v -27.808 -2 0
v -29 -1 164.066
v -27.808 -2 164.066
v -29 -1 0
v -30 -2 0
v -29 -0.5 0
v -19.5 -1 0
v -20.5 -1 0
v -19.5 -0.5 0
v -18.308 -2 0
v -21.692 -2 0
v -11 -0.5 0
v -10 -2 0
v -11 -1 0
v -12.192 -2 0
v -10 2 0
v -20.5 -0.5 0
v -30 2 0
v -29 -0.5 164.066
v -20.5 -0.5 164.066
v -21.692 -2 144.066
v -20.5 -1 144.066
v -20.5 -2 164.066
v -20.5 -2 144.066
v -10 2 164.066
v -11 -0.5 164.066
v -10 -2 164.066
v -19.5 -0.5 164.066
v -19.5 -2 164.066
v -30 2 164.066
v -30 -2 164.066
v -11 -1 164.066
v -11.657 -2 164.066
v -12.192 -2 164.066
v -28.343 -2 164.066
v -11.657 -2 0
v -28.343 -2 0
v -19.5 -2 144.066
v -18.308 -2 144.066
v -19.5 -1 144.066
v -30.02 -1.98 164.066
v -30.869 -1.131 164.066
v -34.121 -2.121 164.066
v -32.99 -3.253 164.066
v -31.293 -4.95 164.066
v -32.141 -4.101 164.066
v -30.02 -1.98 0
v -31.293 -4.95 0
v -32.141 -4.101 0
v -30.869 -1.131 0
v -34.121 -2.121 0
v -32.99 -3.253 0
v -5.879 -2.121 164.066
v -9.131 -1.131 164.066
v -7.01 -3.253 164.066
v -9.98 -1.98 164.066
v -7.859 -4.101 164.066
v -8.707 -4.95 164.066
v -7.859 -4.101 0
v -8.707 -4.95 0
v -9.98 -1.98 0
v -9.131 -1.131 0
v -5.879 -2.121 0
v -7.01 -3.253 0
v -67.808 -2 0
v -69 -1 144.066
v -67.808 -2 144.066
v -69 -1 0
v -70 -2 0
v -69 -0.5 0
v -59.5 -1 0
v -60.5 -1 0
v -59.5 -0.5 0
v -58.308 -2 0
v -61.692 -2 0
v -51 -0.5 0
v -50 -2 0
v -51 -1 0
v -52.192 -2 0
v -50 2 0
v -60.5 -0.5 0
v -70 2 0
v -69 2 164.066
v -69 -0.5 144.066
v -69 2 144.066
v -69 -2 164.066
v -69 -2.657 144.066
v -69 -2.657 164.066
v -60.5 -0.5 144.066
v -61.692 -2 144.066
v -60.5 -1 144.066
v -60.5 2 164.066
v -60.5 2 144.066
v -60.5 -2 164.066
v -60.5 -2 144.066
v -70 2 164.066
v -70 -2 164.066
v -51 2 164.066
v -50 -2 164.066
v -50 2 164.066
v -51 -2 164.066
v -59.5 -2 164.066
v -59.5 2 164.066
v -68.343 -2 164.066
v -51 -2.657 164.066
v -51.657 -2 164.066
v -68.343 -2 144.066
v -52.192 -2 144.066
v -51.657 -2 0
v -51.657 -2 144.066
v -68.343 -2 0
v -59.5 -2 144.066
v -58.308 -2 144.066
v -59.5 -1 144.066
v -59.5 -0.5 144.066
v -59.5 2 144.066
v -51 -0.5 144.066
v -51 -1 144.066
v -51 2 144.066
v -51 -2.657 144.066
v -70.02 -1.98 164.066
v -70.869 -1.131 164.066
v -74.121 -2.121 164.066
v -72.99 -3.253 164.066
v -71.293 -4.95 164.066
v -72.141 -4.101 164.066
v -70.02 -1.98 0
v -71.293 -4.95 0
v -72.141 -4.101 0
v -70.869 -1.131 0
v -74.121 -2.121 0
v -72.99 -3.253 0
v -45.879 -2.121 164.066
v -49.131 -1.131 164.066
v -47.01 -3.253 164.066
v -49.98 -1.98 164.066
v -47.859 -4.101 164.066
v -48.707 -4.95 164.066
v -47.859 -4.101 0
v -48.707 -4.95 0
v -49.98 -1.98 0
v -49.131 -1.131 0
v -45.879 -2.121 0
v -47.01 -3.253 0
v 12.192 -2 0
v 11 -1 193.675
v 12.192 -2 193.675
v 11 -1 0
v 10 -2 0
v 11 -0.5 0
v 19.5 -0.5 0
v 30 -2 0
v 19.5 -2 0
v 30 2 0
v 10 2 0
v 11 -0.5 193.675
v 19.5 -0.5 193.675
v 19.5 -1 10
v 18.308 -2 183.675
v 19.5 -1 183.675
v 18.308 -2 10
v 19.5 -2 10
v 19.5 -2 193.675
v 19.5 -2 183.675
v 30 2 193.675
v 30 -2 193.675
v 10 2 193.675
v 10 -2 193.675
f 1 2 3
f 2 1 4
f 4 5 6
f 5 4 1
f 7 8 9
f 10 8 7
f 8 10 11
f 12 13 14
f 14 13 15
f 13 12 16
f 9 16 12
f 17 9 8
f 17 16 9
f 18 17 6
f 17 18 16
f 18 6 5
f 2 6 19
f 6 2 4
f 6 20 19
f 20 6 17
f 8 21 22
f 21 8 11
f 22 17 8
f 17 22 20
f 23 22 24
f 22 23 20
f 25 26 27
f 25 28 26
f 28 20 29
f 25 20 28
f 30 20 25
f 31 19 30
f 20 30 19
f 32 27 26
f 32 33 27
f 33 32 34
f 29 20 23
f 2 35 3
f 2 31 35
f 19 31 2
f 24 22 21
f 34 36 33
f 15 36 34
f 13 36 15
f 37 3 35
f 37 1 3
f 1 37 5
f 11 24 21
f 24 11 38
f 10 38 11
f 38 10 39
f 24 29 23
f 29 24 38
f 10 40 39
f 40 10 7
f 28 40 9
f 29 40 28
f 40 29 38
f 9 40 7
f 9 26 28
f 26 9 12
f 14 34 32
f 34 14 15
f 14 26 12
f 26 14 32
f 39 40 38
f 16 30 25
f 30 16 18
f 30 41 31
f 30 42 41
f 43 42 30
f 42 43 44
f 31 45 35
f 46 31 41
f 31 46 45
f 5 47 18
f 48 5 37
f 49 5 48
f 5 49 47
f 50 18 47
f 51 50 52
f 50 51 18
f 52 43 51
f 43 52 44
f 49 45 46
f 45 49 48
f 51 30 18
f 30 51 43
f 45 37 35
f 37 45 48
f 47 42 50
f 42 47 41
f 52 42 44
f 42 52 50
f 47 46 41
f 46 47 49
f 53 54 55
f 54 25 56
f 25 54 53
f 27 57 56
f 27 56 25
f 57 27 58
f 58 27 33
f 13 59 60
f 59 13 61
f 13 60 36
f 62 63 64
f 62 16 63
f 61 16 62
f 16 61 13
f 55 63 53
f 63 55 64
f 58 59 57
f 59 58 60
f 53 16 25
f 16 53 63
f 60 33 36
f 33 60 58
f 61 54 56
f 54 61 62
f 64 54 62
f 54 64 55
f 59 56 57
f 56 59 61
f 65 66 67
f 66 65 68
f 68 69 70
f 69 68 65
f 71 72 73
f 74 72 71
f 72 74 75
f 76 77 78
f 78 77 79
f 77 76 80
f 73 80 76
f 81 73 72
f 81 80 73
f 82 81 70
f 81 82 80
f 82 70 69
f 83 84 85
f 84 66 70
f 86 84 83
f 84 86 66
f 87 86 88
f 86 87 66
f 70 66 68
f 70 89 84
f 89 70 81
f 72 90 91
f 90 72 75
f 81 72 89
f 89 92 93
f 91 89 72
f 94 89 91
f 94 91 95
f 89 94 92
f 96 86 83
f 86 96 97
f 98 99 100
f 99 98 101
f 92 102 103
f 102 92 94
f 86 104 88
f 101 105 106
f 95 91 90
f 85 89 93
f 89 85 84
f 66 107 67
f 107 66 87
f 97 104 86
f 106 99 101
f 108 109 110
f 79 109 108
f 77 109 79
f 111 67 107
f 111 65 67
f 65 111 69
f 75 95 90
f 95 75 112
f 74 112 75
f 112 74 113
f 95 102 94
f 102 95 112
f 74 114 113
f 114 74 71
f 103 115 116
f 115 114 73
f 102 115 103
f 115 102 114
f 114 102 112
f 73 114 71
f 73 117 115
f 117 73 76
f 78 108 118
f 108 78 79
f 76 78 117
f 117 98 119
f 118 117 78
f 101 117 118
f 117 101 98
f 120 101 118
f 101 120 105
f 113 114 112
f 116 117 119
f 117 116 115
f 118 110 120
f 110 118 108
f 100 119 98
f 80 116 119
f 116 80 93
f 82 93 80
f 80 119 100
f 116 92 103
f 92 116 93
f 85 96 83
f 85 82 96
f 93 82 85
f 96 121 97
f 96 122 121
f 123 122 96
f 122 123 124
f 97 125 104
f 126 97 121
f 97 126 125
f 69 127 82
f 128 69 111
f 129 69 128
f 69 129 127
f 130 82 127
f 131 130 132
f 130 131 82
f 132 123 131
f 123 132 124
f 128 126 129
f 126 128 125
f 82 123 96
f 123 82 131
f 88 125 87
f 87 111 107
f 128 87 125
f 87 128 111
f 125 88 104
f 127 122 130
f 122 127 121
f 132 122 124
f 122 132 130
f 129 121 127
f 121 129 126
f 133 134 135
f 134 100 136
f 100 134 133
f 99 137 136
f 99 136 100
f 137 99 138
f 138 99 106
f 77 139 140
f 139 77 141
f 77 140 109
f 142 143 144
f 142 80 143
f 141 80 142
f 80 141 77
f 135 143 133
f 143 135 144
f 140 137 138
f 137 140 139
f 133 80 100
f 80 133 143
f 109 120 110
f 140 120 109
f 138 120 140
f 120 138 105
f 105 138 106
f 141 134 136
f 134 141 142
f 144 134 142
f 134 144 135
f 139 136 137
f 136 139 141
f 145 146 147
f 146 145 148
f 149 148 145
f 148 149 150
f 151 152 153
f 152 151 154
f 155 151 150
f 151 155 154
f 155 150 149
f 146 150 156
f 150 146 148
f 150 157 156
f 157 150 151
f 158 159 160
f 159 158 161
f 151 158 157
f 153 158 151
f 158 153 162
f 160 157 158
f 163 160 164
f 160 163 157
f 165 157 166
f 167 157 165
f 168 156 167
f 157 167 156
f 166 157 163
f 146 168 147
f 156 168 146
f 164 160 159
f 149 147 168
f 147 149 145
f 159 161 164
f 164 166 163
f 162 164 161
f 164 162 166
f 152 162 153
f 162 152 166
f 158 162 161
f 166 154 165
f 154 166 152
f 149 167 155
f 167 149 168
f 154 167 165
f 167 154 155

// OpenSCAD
corner_piece_inset_mm = 10;
vertical_bracket_height_mm = (11 + 11/32) * 0.5 * 25.4 + 2 * corner_piece_inset_mm;
horizontal_bracket_length_mm = 7.625 * 25.4;
strip_thickness_mm = 0.5;
strip_width_mm = 8.5;
strip_retention_wall_mm = 1.5;
strip_retention_wall_angle = 40;
strip_separation_mm = 1;
strip_depth_mm = 1;
strip_escape_length_mm = 10;
bracket_width_mm = strip_width_mm * 2 + 3 * strip_separation_mm;
bracket_depth_mm = 4;
mirror_thickness_mm = 1.2;
mirror_retention_depth_mm = 3;
mirror_retention_inset_mm = 1.2;

strip_retention_wall_skew_factor = tan(strip_retention_wall_angle);
strip_retention_wall_x_mm = strip_retention_wall_mm * strip_retention_wall_skew_factor;

module strip_retention(side, height_mm, top_escape_mm, bottom_escape_mm)
{
  strip_offset = 0.5 * (strip_width_mm + strip_separation_mm);

  translate([side * strip_offset, -0.5 * bracket_depth_mm + 0.5 * strip_thickness_mm + strip_depth_mm, 0])
  {
    translate([0, 0, height_mm * 0.5])
    cube([strip_width_mm, strip_thickness_mm, height_mm + 5], center = true);

    translate([0, -0.5 * bracket_depth_mm, height_mm * 0.5])
    cube([strip_width_mm - 2 * strip_retention_wall_mm, bracket_depth_mm, height_mm + 5], center = true);

    difference()
    {
      union()
      for (j = [-1, 1])
      {
        intersection()
        {
          translate([j * (0.5 * strip_width_mm - 0.5 * strip_retention_wall_mm), 0.5 * strip_retention_wall_mm - 0.5 * strip_thickness_mm, height_mm * 0.5])
          multmatrix(
            [[1, 0, 0, 0],
             [j * strip_retention_wall_skew_factor, 1, 0, -0.5 * strip_retention_wall_x_mm],
             [0, 0, 1, 0],
             [0, 0, 0, 1]])
          cube([strip_retention_wall_mm + 0.1, strip_retention_wall_mm, height_mm + 10], center = true);

          translate([0, -3 * bracket_depth_mm + 0.5 * strip_thickness_mm, height_mm * 0.5 + 10])
          cube([strip_width_mm, 6 * bracket_depth_mm, height_mm + 20], center = true);
        }
      }

      translate([0, 3 * bracket_depth_mm + 0.5 * strip_thickness_mm, 0])
      cube([5 * strip_width_mm, 6 * bracket_depth_mm, 5 * height_mm], center = true);
    }

    translate([-side * 0.25 * strip_width_mm, -1.5 * strip_thickness_mm, height_mm - 0.5 * top_escape_mm])
    cube([0.5 * strip_width_mm, 2 * strip_thickness_mm, top_escape_mm], center = true);

    translate([-side * 0.25 * strip_width_mm, -1.5 * strip_thickness_mm, 0.5 * bottom_escape_mm])
    cube([0.5 * strip_width_mm, 2 * strip_thickness_mm, bottom_escape_mm], center = true);
  }
}

module vertical_bracket()
{
  union()
  {
    difference()
    {
      translate([0, 0, vertical_bracket_height_mm * 0.5])
      cube([bracket_width_mm, bracket_depth_mm, vertical_bracket_height_mm], center = true);

      for (i = [-1, 1])
        strip_retention(i, vertical_bracket_height_mm, strip_escape_length_mm + corner_piece_inset_mm, 0);
    }

    mirror_retention_block_width_mm = mirror_retention_depth_mm + bracket_depth_mm / sqrt(2);

    for (i = [-1, 1])
    {
      scale([-i, 1, 1])
      intersection()
      {
        translate([-bracket_width_mm / 2, 0, 0])
        translate([bracket_depth_mm / sqrt(2) / 2, bracket_depth_mm * (1 - sqrt(2) / 2) / 2, 0.5 * vertical_bracket_height_mm])
        rotate([0, 0, 45])
        difference()
        {
          translate([-0.5 * mirror_retention_block_width_mm, 0, 0])
          cube([mirror_retention_block_width_mm, bracket_depth_mm, vertical_bracket_height_mm], center = true);

          translate([-mirror_retention_block_width_mm + 0.5 * mirror_retention_depth_mm - 1, -0.5 * bracket_depth_mm + 0.5 * mirror_thickness_mm + mirror_retention_inset_mm, 0])
          cube([mirror_retention_depth_mm + 2, mirror_thickness_mm, 5 * vertical_bracket_height_mm], center = true);
        }

        union()
        {
          translate([-3.5 * bracket_width_mm, 0, 0])
          cube([6 * bracket_width_mm, 6 * bracket_width_mm, 4 * vertical_bracket_height_mm], center = true);

          translate([0, -3.5 * bracket_depth_mm, 0])
          cube([4 * bracket_width_mm, 6 * bracket_depth_mm, 4 * vertical_bracket_height_mm], center = true);
        }
      }
    }
  }
}

module vertical_bracket_with_cable_port()
{
  difference()
  {
    vertical_bracket();

    cable_port_height_mm = strip_escape_length_mm + corner_piece_inset_mm;

    for (side = [-1, 1])
    {
      strip_offset = 0.5 * (strip_width_mm + strip_separation_mm);

      translate([strip_offset * side, -5, vertical_bracket_height_mm - 0.5 * cable_port_height_mm])
      cube([strip_width_mm, bracket_depth_mm * 5, cable_port_height_mm], center = true);
    }
  }
}

module horizontal_bracket()
{
  difference()
  {
    translate([0, 0, horizontal_bracket_length_mm * 0.5])
    cube([bracket_width_mm, bracket_depth_mm, horizontal_bracket_length_mm], center = true);

    strip_retention(-1, horizontal_bracket_length_mm, strip_escape_length_mm, strip_escape_length_mm);
  }
}

translate([-20, 0, 0])
vertical_bracket();

translate([-60, 0, 0])
vertical_bracket_with_cable_port();

translate([20, 0, 0])
horizontal_bracket();
